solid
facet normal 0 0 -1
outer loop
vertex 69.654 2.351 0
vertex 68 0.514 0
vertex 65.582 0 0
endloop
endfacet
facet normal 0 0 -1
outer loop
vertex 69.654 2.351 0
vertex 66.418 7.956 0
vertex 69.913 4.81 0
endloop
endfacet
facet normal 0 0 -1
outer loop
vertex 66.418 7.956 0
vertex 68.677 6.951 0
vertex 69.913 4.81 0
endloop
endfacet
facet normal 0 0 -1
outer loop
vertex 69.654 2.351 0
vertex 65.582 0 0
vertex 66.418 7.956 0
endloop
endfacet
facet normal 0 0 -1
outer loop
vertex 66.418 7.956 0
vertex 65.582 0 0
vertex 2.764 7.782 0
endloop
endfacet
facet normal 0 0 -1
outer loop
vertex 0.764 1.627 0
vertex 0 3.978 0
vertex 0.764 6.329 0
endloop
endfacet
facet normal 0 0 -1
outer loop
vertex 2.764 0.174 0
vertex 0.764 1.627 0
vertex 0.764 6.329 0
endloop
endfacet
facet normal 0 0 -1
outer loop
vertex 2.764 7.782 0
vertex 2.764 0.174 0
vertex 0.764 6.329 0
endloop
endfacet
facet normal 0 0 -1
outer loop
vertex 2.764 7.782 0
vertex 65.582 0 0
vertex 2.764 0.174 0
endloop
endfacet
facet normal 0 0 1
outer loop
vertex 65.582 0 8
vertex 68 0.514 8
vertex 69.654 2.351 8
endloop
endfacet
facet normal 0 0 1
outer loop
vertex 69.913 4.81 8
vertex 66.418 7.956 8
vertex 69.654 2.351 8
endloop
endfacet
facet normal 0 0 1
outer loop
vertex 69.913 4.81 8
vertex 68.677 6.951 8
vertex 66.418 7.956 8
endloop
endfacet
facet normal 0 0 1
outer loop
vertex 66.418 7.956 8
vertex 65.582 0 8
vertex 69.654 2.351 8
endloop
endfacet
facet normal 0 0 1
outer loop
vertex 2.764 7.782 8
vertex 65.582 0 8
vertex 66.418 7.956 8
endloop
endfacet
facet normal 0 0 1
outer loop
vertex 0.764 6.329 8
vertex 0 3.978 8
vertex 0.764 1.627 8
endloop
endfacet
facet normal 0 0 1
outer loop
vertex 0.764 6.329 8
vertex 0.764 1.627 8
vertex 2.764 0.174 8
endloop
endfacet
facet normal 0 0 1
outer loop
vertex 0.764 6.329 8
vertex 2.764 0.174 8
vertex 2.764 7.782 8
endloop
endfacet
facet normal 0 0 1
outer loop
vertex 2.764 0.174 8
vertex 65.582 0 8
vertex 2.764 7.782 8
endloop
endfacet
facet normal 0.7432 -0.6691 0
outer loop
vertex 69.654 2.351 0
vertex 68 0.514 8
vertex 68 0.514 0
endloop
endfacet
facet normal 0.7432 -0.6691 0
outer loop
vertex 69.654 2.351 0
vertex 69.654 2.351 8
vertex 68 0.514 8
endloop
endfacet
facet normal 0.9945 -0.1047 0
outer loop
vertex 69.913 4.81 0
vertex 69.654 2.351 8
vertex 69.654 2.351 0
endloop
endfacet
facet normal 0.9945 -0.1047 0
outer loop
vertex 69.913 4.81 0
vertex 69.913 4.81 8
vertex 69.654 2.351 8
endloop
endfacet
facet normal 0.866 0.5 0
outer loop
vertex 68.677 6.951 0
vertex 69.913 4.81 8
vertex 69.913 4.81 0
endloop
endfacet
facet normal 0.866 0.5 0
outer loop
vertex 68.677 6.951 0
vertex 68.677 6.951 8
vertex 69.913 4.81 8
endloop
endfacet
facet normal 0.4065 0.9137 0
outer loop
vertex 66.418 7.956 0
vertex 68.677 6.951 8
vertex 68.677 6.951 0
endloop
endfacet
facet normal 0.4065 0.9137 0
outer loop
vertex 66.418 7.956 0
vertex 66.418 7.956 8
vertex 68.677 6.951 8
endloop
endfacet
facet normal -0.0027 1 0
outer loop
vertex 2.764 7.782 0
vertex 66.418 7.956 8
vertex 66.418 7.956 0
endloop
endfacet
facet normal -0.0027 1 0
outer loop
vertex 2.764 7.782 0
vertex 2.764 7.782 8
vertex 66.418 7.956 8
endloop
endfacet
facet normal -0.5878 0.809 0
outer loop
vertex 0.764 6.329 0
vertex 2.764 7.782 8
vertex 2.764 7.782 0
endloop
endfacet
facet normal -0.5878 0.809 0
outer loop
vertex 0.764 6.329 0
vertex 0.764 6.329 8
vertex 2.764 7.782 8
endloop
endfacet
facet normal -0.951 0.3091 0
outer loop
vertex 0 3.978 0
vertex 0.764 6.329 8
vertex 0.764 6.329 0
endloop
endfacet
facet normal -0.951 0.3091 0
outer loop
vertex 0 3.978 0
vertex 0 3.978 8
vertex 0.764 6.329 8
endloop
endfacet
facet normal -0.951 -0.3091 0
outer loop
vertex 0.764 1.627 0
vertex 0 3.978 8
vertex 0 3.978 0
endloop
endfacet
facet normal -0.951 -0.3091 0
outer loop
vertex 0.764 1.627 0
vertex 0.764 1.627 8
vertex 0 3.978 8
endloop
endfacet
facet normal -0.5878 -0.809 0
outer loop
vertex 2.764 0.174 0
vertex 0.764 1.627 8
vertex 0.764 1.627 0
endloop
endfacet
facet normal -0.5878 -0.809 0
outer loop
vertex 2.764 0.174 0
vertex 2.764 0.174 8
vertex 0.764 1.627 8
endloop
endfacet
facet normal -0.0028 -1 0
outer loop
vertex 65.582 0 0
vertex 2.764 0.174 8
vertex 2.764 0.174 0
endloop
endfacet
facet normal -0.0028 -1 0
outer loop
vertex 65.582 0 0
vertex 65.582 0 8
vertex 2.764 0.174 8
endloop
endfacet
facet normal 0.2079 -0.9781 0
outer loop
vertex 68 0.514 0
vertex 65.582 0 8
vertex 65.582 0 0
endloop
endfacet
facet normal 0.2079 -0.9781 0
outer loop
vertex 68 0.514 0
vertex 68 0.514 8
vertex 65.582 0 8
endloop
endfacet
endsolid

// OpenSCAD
$fn = 32;

// ----------------------------------------------------------------------
// Key bar: parallel key, 8 mm thick
// ----------------------------------------------------------------------

// --- parameters (mm) ---
profile_height = 8;       // extrusion height
profile_points = 11;      // points of the closed outline

profile = [[0, 3.978], [0.764, 1.627], [2.764, 0.174], [65.582, 0], [68, 0.514], [69.654, 2.351], [69.913, 4.81], [68.677, 6.951], [66.418, 7.956], [2.764, 7.782], [0.764, 6.329]];  // single closed polygon, 11 points, counter clockwise

// --- the one profile operation ---
linear_extrude(height = profile_height) polygon(points = profile);
